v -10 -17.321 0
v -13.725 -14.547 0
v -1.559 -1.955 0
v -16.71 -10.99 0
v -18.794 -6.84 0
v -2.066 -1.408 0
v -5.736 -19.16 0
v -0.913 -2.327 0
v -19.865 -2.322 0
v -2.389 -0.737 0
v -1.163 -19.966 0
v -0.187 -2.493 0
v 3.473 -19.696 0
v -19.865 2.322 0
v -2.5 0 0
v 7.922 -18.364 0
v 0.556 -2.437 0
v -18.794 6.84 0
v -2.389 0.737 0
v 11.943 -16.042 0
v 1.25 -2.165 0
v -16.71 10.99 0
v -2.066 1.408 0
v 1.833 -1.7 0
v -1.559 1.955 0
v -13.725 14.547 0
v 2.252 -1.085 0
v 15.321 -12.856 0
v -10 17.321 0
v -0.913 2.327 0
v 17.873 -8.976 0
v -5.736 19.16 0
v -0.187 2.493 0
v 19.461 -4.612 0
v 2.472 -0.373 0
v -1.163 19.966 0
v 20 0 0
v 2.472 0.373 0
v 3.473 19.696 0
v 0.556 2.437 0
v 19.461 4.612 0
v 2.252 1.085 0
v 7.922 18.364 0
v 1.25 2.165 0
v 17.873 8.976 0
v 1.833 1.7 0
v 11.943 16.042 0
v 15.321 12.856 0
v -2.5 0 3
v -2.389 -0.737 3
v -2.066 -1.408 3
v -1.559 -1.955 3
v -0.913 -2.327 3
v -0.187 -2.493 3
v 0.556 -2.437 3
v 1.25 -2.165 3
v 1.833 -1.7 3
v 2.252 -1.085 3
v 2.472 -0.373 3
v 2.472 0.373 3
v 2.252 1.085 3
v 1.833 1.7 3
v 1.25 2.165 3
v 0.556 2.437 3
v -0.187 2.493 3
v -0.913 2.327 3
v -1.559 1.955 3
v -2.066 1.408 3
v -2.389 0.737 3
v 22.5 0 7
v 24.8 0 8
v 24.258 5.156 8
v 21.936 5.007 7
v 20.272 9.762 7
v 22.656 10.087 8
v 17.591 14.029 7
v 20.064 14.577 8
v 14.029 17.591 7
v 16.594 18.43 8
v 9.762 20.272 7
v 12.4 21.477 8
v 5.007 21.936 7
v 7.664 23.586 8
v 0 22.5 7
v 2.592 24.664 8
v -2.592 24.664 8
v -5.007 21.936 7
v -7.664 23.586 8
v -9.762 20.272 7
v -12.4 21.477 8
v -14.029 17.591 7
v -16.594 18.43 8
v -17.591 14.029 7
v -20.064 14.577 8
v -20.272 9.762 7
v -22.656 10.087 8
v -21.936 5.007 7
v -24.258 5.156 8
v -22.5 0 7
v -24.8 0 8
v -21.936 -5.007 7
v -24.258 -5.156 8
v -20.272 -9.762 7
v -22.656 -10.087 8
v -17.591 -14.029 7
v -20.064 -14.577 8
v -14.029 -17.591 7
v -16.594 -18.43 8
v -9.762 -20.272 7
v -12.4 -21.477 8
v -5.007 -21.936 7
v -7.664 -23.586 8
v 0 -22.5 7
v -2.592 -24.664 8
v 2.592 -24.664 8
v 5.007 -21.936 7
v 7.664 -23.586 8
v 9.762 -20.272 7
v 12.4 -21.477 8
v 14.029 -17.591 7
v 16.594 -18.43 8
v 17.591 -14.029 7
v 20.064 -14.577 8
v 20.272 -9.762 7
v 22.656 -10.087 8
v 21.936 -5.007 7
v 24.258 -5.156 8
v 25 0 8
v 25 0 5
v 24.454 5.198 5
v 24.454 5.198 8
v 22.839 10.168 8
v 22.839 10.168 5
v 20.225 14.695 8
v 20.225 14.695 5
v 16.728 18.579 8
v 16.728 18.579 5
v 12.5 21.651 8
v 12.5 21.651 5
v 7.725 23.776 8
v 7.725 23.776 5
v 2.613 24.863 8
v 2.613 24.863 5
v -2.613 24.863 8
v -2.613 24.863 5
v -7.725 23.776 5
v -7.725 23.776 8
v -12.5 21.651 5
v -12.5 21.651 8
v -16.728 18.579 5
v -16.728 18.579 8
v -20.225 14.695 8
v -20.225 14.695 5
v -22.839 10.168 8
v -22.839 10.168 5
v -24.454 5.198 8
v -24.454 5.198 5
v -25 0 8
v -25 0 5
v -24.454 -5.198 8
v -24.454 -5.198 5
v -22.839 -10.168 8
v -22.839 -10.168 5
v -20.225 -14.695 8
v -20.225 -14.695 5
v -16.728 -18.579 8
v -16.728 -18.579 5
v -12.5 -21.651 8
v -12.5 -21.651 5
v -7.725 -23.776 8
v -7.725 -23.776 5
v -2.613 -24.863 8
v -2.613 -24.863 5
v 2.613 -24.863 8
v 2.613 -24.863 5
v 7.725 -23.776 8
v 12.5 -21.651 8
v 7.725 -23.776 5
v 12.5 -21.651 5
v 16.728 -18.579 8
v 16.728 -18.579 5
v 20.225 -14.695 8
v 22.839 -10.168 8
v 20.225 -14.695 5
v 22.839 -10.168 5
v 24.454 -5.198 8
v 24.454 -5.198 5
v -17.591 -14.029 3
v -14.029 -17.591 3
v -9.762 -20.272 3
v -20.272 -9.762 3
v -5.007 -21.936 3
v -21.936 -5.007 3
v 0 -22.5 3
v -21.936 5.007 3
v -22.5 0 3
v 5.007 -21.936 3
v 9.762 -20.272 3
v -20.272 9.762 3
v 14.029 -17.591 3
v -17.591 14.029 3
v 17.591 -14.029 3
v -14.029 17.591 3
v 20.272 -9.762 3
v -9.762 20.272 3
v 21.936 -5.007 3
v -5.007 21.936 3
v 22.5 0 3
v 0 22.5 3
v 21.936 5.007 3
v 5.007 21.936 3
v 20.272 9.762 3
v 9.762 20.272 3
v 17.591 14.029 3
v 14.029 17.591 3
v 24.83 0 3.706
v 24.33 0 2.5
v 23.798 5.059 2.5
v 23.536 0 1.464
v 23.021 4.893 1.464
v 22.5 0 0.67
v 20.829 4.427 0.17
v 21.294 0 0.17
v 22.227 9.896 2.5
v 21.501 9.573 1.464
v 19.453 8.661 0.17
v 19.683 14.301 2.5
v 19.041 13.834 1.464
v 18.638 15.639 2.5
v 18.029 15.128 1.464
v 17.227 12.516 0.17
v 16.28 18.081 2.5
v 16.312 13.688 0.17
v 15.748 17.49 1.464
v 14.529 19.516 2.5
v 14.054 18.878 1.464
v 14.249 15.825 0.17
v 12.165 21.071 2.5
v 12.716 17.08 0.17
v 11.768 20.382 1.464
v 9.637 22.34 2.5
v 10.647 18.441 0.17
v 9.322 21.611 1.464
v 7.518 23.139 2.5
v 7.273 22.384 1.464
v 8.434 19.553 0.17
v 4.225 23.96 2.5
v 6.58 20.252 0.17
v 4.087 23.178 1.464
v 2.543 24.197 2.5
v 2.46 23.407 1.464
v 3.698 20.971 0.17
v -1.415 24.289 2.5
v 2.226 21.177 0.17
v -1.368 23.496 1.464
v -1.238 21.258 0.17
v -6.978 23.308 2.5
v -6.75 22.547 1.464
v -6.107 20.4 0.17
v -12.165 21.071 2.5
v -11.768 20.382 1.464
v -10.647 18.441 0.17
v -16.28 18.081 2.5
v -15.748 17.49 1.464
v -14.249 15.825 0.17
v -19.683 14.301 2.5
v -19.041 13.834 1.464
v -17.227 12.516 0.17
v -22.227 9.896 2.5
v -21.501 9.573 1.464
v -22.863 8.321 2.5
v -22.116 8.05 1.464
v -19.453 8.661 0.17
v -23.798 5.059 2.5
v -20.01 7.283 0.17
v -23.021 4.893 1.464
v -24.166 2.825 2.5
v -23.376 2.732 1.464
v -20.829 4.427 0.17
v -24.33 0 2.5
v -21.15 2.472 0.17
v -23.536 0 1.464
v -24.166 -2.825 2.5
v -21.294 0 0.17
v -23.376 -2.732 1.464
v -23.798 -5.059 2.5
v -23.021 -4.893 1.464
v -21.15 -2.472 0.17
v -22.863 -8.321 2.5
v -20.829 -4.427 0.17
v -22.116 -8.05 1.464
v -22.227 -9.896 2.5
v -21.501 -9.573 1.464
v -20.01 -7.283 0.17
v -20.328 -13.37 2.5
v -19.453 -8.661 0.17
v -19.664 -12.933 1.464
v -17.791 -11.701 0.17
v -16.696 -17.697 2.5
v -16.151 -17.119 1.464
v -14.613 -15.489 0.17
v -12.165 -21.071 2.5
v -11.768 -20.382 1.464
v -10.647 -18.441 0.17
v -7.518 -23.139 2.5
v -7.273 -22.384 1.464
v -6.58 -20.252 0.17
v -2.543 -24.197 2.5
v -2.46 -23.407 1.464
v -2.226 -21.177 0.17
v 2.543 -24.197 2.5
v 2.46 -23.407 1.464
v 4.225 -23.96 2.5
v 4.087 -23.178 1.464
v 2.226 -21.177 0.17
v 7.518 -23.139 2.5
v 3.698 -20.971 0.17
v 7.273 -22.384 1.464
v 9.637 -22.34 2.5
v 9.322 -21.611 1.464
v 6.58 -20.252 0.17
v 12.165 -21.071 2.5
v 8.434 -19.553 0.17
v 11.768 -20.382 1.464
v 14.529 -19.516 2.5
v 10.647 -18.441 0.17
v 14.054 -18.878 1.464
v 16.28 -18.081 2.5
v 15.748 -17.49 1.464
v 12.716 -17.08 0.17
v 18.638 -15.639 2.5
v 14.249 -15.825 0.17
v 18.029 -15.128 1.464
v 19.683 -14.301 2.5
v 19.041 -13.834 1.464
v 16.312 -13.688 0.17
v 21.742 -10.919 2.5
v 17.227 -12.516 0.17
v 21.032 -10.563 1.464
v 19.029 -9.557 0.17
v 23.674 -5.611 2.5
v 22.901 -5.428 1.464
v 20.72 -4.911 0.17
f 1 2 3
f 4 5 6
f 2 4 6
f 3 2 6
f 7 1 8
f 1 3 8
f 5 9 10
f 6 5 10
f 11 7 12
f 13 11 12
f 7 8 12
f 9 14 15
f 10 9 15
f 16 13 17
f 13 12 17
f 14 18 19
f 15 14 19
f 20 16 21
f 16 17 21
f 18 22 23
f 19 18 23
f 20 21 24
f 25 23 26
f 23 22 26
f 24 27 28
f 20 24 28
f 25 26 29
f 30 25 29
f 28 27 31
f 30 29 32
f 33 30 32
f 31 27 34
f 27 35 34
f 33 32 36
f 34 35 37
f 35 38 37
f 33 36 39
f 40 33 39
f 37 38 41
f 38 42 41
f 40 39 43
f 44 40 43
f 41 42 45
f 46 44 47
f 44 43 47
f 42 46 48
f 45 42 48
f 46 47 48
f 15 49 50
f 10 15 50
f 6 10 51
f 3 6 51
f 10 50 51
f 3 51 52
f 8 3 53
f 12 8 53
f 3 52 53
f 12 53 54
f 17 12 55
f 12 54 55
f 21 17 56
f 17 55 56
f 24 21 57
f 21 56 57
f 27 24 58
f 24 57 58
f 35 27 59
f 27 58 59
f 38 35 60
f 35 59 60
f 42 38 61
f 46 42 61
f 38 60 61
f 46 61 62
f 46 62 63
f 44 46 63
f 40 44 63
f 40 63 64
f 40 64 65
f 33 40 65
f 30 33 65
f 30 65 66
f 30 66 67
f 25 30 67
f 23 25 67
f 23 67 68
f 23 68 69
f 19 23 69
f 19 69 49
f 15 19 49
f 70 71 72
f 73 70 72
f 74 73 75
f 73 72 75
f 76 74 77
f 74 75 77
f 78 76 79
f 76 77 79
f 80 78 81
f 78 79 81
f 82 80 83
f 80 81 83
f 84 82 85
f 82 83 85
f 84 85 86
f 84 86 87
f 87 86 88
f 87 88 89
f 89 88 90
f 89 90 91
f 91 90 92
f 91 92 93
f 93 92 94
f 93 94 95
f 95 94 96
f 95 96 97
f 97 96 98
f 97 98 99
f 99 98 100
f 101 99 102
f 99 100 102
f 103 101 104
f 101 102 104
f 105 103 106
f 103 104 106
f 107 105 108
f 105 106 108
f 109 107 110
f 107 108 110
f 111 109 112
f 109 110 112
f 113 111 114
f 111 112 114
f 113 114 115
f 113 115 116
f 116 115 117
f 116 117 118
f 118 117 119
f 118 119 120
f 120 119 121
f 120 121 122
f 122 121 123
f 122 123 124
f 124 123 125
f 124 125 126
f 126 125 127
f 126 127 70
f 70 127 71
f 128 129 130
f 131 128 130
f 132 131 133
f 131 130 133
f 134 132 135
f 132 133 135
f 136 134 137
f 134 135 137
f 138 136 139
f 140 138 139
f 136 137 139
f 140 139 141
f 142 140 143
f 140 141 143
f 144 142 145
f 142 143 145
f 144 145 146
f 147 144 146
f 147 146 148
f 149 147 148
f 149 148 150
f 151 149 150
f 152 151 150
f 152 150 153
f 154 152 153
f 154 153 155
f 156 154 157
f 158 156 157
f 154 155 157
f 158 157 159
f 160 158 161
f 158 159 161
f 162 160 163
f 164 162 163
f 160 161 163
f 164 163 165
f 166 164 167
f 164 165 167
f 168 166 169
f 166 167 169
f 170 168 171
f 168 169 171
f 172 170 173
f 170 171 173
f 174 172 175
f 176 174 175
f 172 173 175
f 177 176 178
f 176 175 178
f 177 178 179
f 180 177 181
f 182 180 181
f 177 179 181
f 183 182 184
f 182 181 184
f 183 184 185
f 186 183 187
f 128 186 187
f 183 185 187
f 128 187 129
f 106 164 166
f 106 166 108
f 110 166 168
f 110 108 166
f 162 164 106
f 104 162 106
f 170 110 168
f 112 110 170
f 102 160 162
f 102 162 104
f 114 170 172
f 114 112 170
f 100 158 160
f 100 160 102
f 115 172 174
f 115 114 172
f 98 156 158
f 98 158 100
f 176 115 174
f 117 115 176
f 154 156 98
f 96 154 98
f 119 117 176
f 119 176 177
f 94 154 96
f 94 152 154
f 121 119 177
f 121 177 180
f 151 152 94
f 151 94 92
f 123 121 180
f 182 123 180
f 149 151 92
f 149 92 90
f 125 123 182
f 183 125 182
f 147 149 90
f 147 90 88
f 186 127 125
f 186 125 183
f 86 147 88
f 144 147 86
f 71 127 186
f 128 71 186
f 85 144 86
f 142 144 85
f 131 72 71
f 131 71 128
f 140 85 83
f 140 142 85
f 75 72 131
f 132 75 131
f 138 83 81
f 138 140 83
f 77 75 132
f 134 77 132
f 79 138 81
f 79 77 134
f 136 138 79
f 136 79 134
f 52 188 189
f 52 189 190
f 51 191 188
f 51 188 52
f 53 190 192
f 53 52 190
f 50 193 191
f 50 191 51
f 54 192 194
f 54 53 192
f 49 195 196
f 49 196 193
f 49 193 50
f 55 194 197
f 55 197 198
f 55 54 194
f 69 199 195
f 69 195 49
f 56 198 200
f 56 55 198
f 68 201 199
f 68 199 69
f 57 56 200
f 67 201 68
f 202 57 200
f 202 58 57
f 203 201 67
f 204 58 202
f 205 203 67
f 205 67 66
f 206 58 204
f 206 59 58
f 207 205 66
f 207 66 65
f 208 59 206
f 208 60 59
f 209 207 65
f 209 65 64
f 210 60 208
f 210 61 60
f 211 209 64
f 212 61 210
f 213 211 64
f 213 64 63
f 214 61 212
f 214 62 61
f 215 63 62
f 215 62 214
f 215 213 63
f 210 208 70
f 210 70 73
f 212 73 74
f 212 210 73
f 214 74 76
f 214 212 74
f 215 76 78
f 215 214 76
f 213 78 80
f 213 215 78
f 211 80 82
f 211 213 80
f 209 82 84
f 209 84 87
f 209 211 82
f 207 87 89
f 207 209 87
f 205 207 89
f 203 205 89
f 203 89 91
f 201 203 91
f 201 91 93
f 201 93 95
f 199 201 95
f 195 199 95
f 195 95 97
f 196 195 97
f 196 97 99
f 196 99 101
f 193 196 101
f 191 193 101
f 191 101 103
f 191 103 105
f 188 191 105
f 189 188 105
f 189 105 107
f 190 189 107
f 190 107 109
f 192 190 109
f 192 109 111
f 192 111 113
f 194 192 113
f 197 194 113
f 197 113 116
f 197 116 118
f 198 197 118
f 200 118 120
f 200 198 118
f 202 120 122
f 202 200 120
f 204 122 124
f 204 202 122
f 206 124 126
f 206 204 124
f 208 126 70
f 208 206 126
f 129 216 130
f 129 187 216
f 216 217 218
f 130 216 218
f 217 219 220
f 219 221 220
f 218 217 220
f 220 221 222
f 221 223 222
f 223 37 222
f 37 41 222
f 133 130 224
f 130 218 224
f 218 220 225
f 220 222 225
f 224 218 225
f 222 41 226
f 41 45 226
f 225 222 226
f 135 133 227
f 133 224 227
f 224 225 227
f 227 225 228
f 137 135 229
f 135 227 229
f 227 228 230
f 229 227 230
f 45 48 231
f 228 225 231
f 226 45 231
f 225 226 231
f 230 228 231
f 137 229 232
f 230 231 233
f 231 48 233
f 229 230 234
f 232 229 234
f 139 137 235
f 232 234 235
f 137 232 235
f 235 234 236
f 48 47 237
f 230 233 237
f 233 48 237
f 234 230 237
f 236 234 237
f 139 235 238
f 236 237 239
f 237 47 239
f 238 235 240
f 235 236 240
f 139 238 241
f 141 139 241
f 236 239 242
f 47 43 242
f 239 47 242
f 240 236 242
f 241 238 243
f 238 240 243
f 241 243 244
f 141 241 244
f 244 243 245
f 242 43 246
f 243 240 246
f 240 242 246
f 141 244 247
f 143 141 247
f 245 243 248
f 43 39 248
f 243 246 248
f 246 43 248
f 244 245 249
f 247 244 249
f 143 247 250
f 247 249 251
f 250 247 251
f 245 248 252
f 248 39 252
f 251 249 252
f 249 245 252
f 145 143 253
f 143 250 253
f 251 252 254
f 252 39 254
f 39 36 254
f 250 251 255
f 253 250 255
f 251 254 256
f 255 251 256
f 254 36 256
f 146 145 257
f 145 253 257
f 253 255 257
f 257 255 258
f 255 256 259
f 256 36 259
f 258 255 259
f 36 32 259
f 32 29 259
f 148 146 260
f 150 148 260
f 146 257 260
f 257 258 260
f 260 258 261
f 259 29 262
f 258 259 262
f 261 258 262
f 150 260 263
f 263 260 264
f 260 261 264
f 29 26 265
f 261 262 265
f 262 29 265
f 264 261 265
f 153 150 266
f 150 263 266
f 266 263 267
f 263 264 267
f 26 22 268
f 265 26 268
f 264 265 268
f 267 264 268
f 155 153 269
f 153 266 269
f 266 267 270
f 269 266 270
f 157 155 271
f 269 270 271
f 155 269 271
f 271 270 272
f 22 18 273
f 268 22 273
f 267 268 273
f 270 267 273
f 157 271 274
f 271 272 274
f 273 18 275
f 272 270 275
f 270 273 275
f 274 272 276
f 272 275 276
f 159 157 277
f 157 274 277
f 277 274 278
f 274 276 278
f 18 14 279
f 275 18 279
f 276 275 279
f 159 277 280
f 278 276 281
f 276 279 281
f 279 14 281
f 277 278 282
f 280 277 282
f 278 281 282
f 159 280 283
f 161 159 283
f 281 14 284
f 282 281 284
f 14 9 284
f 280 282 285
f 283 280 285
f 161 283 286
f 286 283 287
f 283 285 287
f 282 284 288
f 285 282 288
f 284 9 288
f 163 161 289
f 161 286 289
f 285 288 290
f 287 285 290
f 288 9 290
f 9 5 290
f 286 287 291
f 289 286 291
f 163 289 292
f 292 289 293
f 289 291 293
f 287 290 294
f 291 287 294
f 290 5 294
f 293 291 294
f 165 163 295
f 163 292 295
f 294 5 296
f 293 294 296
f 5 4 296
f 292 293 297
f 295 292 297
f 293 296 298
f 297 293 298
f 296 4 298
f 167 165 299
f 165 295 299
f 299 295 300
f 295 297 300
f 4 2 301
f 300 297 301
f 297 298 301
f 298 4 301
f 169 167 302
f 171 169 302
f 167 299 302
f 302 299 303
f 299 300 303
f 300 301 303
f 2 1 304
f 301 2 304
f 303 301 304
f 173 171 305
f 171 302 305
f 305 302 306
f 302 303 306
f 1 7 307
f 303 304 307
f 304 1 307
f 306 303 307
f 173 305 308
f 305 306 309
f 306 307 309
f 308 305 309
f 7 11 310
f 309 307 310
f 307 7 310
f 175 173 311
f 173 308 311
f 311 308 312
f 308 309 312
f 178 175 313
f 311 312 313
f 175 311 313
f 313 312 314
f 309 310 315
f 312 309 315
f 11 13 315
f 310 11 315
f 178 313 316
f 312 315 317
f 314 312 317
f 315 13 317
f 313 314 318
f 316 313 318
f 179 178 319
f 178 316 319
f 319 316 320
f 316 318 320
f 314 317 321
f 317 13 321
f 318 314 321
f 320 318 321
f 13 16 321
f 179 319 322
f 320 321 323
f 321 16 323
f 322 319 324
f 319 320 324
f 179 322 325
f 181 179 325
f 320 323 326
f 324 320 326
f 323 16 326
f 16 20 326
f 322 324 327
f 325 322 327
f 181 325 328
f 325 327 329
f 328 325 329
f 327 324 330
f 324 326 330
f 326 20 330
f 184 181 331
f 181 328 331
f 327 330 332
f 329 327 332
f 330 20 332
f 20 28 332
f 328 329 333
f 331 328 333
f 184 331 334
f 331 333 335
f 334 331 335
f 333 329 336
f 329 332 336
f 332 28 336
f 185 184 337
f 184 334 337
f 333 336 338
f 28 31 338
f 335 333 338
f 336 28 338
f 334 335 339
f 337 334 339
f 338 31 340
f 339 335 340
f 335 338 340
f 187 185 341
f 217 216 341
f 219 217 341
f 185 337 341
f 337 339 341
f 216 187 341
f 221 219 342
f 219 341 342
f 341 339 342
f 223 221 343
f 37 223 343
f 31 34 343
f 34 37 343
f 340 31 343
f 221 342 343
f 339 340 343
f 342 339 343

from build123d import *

# Parameters (mm, degrees)
F0_R     = 22.5
F1_DEPTH = 3
F0_R_2   = 25
F2_DEPTH = 8
F3_R     = 5
F4_SIZE2 = 2.3
F4_SIZE  = 1
F5_D     = 5


with BuildPart() as f1:
    # F0 (on Top) → F1 (new body)
    with BuildSketch(Plane.XY):
        Circle(F0_R)
    extrude(amount=F1_DEPTH)

    # F0 (on Top) → F2 (join)
    with BuildSketch(Plane.XY):
        Circle(F0_R_2)
        Circle(F0_R, mode=Mode.SUBTRACT)
    extrude(amount=F2_DEPTH)

    # F3
    f3_edges = [f1.edges().sort_by_distance(p)[0] for p in [
        (-25, 0, 0),
    ]]
    fillet(f3_edges, radius=F3_R)

    # F4
    f4_edges = [f1.edges().sort_by_distance(p)[0] for p in [
        (-22.5, 0, 8),
    ]]
    f4_side = f1.faces().sort_by_distance((-22.5, 0, 5.5))[0]
    chamfer(f4_edges, length=F4_SIZE, length2=F4_SIZE2, reference=f4_side)

    # F5 (through all)
    with Locations(Plane(origin=(0, 0, 0), x_dir=(1, 0, 0), z_dir=(0, 0, -1))):
        with Locations((0, 0)):
            Hole(F5_D / 2)


solid = f1.part
